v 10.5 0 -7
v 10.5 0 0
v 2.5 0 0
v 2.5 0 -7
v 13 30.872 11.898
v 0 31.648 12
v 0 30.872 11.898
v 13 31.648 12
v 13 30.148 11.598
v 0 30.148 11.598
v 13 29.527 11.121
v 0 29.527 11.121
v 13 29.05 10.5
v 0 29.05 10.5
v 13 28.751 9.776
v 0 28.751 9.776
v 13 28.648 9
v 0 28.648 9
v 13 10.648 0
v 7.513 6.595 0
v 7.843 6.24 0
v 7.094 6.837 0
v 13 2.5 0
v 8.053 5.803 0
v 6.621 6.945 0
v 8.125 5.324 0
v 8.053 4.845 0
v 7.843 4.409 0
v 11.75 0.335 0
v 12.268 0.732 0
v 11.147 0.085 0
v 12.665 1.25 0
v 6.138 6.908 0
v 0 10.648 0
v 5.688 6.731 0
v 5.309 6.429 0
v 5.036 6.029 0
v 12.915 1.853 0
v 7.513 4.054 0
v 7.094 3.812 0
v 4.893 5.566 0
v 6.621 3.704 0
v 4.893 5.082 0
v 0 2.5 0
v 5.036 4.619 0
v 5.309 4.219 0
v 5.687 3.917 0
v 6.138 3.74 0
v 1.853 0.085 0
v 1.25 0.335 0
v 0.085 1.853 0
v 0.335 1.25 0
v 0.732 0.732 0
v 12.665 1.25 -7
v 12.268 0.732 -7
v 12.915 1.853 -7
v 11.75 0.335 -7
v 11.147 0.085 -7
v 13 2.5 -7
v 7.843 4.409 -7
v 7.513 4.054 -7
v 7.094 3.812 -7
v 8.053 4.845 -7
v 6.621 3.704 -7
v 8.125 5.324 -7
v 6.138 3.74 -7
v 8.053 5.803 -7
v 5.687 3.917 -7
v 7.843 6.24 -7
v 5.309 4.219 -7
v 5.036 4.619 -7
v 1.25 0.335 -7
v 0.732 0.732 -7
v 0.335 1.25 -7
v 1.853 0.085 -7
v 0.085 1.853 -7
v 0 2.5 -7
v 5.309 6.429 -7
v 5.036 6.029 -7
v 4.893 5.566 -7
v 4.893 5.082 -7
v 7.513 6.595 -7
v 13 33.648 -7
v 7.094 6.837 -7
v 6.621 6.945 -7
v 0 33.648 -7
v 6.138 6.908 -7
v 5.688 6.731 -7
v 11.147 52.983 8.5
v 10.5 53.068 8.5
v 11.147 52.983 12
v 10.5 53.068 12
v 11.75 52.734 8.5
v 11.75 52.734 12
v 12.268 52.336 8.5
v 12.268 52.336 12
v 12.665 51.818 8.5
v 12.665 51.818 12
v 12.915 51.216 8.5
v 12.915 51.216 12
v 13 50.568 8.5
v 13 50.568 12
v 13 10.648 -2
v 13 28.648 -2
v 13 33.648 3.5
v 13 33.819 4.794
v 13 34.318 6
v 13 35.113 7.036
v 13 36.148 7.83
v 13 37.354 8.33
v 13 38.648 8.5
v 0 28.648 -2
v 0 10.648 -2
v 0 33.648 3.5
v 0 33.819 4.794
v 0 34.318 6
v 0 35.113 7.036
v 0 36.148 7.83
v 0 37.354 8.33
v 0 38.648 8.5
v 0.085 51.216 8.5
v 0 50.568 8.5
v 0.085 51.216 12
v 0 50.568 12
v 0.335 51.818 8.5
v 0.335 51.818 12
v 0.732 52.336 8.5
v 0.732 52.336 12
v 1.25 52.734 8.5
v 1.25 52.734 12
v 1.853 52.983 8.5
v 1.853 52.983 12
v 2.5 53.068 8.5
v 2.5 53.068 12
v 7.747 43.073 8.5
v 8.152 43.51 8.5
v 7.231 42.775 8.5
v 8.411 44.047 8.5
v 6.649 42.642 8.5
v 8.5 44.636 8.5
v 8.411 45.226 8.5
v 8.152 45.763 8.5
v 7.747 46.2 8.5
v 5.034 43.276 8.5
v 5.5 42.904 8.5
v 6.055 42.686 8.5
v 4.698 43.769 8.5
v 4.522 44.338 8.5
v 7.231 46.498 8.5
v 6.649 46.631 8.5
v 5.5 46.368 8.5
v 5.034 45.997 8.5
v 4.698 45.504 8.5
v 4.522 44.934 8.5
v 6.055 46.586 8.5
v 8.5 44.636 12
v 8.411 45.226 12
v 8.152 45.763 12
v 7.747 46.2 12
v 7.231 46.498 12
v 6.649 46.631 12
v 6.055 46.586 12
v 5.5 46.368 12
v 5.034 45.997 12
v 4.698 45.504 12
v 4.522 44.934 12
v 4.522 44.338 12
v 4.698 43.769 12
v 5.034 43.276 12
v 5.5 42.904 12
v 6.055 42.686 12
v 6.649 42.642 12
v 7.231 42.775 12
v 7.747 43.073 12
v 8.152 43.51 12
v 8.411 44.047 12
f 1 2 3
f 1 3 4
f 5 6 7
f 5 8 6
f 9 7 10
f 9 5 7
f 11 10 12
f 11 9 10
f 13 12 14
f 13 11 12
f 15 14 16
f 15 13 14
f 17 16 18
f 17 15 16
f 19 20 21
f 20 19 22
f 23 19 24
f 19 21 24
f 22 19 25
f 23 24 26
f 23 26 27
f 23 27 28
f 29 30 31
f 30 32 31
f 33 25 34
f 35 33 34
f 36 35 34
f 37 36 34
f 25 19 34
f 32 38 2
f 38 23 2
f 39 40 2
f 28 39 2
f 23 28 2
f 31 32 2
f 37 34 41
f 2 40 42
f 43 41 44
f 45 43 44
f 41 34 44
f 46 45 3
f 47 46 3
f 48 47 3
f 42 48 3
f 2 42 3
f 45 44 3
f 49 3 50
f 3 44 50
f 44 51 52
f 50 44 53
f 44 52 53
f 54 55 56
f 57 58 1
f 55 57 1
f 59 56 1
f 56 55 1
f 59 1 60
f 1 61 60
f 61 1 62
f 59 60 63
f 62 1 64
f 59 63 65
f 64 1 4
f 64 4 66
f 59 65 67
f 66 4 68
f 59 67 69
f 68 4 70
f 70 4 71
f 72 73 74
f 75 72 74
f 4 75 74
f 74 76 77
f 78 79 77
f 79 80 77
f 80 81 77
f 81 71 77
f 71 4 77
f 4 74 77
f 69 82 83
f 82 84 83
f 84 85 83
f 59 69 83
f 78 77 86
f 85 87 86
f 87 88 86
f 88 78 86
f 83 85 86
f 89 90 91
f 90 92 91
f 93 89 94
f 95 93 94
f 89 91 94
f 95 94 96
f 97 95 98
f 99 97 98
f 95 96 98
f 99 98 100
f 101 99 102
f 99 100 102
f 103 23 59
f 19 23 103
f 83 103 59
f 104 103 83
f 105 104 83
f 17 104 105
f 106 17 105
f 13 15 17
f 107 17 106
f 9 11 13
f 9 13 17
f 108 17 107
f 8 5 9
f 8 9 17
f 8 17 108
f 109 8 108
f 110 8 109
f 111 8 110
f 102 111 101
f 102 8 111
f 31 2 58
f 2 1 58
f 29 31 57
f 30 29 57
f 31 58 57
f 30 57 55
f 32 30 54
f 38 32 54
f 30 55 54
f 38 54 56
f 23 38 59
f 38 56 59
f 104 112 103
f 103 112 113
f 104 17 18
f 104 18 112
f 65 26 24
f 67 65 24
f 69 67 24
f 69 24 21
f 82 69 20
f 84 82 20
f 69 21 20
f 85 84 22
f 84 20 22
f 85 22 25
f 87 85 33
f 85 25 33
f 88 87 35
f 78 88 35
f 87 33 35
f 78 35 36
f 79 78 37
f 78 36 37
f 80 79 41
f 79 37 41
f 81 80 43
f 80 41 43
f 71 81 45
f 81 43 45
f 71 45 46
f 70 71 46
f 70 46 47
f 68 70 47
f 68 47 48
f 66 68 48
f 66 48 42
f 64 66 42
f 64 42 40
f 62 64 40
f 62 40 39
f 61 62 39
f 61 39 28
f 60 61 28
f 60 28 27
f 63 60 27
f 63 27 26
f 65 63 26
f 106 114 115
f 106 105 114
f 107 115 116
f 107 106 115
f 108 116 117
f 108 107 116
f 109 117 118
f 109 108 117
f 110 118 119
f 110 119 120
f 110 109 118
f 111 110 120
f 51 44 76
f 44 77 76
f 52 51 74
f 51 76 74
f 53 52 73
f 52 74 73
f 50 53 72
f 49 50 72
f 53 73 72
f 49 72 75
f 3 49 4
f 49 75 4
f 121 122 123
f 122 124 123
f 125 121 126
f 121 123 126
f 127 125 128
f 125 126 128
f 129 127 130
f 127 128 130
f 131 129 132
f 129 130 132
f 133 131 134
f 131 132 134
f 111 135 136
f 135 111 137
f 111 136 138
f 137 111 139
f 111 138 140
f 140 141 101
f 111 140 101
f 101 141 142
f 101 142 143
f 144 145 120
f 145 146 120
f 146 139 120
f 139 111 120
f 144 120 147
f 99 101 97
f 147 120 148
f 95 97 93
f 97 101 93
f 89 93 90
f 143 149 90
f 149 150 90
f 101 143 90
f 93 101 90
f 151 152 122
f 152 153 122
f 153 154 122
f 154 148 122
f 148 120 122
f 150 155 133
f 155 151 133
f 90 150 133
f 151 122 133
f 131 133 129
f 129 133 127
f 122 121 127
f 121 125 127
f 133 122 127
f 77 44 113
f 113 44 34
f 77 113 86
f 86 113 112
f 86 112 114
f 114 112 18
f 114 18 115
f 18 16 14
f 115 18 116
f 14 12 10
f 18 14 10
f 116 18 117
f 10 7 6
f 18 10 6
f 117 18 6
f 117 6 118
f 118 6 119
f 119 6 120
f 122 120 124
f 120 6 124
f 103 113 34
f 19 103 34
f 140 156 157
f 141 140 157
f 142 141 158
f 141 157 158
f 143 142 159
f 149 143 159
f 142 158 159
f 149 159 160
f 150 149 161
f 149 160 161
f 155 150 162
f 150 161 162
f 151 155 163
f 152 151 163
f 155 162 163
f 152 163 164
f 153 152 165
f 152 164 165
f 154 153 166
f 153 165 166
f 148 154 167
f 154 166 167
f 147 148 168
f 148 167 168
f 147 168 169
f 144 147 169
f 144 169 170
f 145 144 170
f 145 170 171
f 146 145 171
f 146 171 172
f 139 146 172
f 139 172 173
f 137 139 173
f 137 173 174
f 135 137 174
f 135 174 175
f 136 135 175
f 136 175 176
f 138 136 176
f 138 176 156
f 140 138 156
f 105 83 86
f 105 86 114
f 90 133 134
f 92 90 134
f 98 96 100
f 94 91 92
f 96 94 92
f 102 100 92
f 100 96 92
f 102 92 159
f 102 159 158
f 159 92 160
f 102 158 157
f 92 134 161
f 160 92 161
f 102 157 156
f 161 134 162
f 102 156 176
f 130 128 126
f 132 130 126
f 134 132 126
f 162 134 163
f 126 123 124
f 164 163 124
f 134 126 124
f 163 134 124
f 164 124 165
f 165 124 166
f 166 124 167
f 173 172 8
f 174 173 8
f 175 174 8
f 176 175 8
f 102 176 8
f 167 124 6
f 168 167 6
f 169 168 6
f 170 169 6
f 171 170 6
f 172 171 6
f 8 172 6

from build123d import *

# Parameters (mm, degrees)
F1_DEPTH = 13
F2_R     = 1.625
F3_DEPTH = 25
F4_R     = 2
F5_DEPTH = 25
F6_R     = 5
F7_R     = 3
F8_R     = 2.5


with BuildPart() as f1:
    # F0 (on Right) → F1 (new body)
    with BuildSketch(Plane.YZ):
        Polygon((10.648379, 0), (0, 0), (0, -7), (33.648379, -7), (33.648379, 8.5), (53.068466, 8.5), (53.068466, 12), (28.648379, 12), (28.648379, -2), (10.648379, -2), align=None)
    extrude(amount=F1_DEPTH)

    # F2 (on face) → F3 (cut)
    with BuildSketch(Plane.XY):
        with Locations((6.5, 5.32419)):
            Circle(F2_R)
    extrude(amount=-F3_DEPTH, mode=Mode.SUBTRACT)

    # F4 (on face) → F5 (cut)
    with BuildSketch(Plane.XY.offset(12)):
        with Locations((6.5, 44.636294)):
            Circle(F4_R)
    extrude(amount=-F5_DEPTH, mode=Mode.SUBTRACT)

    # F6
    f6_edges = [f1.edges().sort_by_distance(p)[0] for p in [
        (6.5, 33.648379, 8.5),
    ]]
    fillet(f6_edges, radius=F6_R)

    # F7
    f7_edges = [f1.edges().sort_by_distance(p)[0] for p in [
        (6.5, 28.648379, 12),
    ]]
    fillet(f7_edges, radius=F7_R)

    # F8
    f8_edges = [f1.edges().sort_by_distance(p)[0] for p in [
        (13, 53.068466, 10.25),
        (0, 53.068466, 10.25),
        (13, 0, -3.5),
        (0, 0, -3.5),
    ]]
    fillet(f8_edges, radius=F8_R)


solid = f1.part
